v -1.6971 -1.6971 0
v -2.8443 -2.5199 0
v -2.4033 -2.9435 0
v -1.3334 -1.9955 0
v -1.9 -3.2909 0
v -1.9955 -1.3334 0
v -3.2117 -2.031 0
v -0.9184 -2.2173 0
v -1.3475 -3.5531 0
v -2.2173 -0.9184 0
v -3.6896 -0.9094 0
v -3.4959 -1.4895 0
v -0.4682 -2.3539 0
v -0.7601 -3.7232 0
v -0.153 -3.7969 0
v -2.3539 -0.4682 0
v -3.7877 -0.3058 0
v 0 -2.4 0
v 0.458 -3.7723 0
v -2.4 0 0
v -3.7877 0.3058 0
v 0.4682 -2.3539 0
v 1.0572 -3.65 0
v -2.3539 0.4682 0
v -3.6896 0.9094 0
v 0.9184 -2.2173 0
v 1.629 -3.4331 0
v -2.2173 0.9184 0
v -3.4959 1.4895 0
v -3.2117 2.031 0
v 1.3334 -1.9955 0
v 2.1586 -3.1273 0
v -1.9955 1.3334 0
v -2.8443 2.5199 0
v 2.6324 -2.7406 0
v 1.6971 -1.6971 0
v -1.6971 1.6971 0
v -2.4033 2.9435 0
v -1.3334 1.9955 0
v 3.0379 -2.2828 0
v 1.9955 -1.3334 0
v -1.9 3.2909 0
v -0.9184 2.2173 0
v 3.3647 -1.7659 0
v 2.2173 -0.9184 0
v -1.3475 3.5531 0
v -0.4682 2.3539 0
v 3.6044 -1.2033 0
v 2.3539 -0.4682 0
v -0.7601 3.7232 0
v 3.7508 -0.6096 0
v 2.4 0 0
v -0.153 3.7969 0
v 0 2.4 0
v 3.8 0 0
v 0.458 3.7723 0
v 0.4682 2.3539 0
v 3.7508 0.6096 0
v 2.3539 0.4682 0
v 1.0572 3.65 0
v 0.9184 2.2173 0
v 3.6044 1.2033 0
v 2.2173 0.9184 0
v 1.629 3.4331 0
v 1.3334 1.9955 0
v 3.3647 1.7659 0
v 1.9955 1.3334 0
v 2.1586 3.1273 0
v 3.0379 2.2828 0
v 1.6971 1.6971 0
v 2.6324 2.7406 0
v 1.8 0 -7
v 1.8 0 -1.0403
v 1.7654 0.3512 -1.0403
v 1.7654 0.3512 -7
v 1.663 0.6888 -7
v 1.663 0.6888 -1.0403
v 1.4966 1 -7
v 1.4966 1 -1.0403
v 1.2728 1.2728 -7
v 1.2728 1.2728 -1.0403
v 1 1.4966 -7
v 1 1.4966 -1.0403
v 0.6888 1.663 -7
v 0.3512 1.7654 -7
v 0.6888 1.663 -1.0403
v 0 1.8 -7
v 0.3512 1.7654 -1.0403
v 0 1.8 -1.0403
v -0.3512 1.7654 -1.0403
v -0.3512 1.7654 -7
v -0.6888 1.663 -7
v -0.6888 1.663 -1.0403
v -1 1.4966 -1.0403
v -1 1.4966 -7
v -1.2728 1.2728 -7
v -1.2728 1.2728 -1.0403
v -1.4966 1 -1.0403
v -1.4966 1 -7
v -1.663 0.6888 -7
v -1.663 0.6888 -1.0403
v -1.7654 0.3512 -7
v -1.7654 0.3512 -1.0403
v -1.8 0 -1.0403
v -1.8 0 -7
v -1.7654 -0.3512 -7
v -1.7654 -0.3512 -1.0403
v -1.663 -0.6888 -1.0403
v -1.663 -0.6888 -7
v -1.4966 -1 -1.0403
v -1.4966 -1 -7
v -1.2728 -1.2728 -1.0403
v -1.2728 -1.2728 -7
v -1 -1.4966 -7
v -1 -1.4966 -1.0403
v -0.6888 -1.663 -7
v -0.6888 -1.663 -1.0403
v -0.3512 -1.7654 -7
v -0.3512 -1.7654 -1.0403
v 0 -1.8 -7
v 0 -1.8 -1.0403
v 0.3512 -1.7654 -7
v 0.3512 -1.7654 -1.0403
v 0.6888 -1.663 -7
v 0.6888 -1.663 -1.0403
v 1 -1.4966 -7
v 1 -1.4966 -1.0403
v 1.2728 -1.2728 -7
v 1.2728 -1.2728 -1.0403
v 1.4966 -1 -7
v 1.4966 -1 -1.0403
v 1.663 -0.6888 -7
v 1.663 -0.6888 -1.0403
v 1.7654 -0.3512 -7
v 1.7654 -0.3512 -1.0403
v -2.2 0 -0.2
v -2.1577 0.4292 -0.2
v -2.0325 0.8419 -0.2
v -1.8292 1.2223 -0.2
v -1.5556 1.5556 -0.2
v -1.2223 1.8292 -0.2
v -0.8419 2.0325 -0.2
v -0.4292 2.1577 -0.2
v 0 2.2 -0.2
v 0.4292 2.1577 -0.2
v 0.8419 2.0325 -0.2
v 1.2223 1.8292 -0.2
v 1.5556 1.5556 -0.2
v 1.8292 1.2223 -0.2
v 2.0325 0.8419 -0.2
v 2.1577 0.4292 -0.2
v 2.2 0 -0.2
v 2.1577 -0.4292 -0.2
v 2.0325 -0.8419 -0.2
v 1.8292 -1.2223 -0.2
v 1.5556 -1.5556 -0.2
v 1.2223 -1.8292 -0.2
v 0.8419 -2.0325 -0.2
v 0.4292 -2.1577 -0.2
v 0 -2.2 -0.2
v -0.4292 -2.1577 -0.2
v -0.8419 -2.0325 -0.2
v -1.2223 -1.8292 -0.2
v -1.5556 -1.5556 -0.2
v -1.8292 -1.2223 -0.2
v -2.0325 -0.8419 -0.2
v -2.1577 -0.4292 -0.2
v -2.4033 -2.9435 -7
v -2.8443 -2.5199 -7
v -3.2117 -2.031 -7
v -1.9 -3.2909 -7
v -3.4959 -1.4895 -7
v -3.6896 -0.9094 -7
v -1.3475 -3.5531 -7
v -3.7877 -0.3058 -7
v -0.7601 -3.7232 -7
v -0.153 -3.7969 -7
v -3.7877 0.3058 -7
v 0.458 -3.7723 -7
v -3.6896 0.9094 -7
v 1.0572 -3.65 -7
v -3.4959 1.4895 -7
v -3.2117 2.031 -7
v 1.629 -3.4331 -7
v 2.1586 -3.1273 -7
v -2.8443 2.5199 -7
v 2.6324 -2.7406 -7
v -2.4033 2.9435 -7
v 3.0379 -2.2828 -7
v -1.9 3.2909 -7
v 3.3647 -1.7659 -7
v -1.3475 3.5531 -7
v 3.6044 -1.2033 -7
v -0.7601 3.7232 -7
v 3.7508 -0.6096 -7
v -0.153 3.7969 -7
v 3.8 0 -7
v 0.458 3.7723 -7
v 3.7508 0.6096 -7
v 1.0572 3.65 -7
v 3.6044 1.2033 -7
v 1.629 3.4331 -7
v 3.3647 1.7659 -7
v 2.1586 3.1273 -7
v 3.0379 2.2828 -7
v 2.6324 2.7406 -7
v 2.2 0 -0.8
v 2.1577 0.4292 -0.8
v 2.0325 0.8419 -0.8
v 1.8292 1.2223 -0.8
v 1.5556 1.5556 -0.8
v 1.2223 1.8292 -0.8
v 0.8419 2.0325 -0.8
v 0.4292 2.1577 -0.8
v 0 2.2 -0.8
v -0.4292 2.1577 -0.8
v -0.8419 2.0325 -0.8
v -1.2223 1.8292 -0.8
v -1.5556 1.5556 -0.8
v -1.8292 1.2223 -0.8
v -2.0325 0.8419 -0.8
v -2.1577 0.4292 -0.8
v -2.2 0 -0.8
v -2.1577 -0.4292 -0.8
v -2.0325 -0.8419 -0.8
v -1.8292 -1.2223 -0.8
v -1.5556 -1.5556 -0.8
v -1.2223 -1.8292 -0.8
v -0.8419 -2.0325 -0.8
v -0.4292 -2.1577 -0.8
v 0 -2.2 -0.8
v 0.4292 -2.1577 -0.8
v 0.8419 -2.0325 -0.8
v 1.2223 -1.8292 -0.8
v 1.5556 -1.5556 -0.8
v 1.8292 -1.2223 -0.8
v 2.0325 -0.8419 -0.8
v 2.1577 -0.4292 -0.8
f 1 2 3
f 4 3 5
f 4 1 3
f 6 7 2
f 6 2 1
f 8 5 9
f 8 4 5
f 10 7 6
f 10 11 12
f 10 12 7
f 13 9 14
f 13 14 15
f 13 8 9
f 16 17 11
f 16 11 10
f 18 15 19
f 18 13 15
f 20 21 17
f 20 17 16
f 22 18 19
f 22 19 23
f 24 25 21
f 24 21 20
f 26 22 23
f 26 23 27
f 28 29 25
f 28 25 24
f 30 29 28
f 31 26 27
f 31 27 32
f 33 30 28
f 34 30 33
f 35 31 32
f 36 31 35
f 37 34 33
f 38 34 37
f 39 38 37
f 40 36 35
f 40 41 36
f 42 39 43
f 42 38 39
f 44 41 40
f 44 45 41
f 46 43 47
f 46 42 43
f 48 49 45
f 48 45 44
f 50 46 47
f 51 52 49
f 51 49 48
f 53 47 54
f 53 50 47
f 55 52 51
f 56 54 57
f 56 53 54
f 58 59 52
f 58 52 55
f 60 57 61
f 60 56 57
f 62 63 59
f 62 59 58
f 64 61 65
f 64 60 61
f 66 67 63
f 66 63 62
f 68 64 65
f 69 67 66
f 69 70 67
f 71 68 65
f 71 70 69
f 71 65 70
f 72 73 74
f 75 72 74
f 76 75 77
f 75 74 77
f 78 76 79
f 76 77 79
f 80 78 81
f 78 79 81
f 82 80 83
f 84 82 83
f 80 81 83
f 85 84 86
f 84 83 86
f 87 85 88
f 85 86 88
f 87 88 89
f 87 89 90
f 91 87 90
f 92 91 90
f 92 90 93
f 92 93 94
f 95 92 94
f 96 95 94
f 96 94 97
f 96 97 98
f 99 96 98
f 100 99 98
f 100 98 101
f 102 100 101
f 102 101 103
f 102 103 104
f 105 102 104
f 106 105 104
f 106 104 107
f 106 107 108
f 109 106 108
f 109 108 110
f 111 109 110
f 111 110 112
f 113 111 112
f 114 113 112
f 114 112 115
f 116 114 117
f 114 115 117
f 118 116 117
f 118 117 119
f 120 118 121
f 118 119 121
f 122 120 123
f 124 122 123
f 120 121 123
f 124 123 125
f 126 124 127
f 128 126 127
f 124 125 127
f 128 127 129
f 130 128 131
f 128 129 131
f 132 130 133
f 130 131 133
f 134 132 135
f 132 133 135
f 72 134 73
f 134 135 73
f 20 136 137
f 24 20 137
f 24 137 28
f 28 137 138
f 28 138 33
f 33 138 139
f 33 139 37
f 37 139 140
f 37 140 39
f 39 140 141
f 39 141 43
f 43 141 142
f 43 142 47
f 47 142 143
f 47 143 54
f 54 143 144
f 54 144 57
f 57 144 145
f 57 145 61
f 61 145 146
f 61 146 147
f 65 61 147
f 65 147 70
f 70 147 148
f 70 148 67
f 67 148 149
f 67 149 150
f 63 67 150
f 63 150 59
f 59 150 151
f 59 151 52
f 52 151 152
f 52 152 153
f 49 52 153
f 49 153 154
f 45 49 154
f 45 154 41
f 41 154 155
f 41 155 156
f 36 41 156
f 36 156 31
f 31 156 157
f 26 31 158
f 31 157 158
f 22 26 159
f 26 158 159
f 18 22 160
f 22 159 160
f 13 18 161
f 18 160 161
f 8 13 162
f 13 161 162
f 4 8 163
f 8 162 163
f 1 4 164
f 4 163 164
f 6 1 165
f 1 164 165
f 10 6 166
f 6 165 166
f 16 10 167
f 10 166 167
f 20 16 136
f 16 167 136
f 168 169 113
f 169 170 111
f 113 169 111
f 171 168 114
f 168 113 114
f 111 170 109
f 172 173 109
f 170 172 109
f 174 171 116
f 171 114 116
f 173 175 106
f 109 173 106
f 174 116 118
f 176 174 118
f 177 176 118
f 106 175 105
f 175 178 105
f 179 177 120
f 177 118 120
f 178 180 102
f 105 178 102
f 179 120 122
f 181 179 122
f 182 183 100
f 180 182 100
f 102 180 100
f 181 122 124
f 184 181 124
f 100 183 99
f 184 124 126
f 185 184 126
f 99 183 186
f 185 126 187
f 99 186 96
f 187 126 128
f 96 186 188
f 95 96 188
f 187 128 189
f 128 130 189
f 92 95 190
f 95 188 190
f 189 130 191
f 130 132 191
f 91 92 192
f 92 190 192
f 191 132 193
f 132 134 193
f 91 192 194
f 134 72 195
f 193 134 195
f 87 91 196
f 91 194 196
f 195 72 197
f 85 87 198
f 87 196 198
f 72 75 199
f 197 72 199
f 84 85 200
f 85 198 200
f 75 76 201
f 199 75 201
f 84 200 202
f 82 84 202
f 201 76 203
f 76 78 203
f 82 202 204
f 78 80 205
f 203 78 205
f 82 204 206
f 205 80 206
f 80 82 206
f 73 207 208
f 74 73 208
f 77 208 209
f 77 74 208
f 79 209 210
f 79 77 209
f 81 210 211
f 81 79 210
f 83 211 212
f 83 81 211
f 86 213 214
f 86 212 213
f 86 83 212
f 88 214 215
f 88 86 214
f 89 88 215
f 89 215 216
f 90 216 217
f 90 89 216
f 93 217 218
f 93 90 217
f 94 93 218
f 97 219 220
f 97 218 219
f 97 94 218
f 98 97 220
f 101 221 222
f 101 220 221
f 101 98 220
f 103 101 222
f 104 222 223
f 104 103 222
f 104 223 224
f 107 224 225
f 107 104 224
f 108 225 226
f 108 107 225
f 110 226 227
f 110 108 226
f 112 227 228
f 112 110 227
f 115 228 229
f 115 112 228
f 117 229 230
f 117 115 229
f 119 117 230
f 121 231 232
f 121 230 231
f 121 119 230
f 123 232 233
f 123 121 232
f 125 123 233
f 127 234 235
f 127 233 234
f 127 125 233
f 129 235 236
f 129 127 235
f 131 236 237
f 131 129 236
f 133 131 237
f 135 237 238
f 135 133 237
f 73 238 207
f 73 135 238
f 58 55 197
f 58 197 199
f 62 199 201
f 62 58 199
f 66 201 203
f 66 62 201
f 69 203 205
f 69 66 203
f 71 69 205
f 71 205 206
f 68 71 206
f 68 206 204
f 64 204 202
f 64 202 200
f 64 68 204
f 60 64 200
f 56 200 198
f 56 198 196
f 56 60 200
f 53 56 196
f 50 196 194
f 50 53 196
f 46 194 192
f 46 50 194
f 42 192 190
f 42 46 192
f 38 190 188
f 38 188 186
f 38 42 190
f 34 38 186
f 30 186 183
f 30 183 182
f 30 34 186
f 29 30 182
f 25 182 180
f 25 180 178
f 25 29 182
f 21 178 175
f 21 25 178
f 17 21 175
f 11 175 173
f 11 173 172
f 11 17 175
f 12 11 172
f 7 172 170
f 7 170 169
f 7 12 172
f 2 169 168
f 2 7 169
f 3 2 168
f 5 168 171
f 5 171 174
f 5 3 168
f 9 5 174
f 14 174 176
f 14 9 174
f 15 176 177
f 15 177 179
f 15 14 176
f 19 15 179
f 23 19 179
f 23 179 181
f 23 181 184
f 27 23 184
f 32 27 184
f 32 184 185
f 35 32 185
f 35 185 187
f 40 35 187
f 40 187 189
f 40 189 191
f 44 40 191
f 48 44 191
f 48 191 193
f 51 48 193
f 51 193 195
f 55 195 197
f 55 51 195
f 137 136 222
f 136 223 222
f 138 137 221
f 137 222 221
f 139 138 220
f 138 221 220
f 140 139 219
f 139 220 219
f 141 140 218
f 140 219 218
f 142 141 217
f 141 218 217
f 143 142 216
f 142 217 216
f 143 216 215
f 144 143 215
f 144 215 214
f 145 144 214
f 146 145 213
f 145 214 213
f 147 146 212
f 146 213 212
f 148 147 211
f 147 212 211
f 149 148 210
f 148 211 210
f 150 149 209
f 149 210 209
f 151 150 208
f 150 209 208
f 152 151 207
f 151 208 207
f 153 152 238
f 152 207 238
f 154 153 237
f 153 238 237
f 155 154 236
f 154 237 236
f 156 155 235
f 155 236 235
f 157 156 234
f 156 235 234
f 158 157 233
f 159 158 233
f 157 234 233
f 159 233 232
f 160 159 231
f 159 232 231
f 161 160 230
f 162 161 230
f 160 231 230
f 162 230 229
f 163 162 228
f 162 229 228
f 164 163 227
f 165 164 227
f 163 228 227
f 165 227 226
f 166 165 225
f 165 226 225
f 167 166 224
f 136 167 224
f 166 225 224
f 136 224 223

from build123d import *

# Parameters (mm, degrees)
SKETCH002_R      = 3.8
SKETCH002_R_2    = 1.8
PAD002_DEPTH     = 7
HOLE_D           = 4.4
HOLE_DEPTH       = 0.8
HOLE_CSINK_D     = 4.8
HOLE_CSINK_ANGLE = 90
HOLE_TIPS_R      = 2.2


with BuildPart() as part:
    # Sketch002 → Pad002 (new body)
    with BuildSketch(Plane.XY):
        Circle(SKETCH002_R)
        Circle(SKETCH002_R_2, mode=Mode.SUBTRACT)
    extrude(amount=-PAD002_DEPTH)

    # Hole
    with Locations(Plane.XY):
        with Locations((0, 0)):
            CounterSinkHole(HOLE_D / 2, HOLE_CSINK_D / 2, depth=HOLE_DEPTH, counter_sink_angle=HOLE_CSINK_ANGLE)

    # Hole tips → Hole tip 1 section 0
    with BuildSketch(Plane.XY.offset(-0.8), mode=Mode.PRIVATE) as hole_tip_1_s0:
        Circle(HOLE_TIPS_R)
    loft([hole_tip_1_s0.sketch, Vertex(0, 0, -2.121893)], mode=Mode.SUBTRACT)


solid = part.part
